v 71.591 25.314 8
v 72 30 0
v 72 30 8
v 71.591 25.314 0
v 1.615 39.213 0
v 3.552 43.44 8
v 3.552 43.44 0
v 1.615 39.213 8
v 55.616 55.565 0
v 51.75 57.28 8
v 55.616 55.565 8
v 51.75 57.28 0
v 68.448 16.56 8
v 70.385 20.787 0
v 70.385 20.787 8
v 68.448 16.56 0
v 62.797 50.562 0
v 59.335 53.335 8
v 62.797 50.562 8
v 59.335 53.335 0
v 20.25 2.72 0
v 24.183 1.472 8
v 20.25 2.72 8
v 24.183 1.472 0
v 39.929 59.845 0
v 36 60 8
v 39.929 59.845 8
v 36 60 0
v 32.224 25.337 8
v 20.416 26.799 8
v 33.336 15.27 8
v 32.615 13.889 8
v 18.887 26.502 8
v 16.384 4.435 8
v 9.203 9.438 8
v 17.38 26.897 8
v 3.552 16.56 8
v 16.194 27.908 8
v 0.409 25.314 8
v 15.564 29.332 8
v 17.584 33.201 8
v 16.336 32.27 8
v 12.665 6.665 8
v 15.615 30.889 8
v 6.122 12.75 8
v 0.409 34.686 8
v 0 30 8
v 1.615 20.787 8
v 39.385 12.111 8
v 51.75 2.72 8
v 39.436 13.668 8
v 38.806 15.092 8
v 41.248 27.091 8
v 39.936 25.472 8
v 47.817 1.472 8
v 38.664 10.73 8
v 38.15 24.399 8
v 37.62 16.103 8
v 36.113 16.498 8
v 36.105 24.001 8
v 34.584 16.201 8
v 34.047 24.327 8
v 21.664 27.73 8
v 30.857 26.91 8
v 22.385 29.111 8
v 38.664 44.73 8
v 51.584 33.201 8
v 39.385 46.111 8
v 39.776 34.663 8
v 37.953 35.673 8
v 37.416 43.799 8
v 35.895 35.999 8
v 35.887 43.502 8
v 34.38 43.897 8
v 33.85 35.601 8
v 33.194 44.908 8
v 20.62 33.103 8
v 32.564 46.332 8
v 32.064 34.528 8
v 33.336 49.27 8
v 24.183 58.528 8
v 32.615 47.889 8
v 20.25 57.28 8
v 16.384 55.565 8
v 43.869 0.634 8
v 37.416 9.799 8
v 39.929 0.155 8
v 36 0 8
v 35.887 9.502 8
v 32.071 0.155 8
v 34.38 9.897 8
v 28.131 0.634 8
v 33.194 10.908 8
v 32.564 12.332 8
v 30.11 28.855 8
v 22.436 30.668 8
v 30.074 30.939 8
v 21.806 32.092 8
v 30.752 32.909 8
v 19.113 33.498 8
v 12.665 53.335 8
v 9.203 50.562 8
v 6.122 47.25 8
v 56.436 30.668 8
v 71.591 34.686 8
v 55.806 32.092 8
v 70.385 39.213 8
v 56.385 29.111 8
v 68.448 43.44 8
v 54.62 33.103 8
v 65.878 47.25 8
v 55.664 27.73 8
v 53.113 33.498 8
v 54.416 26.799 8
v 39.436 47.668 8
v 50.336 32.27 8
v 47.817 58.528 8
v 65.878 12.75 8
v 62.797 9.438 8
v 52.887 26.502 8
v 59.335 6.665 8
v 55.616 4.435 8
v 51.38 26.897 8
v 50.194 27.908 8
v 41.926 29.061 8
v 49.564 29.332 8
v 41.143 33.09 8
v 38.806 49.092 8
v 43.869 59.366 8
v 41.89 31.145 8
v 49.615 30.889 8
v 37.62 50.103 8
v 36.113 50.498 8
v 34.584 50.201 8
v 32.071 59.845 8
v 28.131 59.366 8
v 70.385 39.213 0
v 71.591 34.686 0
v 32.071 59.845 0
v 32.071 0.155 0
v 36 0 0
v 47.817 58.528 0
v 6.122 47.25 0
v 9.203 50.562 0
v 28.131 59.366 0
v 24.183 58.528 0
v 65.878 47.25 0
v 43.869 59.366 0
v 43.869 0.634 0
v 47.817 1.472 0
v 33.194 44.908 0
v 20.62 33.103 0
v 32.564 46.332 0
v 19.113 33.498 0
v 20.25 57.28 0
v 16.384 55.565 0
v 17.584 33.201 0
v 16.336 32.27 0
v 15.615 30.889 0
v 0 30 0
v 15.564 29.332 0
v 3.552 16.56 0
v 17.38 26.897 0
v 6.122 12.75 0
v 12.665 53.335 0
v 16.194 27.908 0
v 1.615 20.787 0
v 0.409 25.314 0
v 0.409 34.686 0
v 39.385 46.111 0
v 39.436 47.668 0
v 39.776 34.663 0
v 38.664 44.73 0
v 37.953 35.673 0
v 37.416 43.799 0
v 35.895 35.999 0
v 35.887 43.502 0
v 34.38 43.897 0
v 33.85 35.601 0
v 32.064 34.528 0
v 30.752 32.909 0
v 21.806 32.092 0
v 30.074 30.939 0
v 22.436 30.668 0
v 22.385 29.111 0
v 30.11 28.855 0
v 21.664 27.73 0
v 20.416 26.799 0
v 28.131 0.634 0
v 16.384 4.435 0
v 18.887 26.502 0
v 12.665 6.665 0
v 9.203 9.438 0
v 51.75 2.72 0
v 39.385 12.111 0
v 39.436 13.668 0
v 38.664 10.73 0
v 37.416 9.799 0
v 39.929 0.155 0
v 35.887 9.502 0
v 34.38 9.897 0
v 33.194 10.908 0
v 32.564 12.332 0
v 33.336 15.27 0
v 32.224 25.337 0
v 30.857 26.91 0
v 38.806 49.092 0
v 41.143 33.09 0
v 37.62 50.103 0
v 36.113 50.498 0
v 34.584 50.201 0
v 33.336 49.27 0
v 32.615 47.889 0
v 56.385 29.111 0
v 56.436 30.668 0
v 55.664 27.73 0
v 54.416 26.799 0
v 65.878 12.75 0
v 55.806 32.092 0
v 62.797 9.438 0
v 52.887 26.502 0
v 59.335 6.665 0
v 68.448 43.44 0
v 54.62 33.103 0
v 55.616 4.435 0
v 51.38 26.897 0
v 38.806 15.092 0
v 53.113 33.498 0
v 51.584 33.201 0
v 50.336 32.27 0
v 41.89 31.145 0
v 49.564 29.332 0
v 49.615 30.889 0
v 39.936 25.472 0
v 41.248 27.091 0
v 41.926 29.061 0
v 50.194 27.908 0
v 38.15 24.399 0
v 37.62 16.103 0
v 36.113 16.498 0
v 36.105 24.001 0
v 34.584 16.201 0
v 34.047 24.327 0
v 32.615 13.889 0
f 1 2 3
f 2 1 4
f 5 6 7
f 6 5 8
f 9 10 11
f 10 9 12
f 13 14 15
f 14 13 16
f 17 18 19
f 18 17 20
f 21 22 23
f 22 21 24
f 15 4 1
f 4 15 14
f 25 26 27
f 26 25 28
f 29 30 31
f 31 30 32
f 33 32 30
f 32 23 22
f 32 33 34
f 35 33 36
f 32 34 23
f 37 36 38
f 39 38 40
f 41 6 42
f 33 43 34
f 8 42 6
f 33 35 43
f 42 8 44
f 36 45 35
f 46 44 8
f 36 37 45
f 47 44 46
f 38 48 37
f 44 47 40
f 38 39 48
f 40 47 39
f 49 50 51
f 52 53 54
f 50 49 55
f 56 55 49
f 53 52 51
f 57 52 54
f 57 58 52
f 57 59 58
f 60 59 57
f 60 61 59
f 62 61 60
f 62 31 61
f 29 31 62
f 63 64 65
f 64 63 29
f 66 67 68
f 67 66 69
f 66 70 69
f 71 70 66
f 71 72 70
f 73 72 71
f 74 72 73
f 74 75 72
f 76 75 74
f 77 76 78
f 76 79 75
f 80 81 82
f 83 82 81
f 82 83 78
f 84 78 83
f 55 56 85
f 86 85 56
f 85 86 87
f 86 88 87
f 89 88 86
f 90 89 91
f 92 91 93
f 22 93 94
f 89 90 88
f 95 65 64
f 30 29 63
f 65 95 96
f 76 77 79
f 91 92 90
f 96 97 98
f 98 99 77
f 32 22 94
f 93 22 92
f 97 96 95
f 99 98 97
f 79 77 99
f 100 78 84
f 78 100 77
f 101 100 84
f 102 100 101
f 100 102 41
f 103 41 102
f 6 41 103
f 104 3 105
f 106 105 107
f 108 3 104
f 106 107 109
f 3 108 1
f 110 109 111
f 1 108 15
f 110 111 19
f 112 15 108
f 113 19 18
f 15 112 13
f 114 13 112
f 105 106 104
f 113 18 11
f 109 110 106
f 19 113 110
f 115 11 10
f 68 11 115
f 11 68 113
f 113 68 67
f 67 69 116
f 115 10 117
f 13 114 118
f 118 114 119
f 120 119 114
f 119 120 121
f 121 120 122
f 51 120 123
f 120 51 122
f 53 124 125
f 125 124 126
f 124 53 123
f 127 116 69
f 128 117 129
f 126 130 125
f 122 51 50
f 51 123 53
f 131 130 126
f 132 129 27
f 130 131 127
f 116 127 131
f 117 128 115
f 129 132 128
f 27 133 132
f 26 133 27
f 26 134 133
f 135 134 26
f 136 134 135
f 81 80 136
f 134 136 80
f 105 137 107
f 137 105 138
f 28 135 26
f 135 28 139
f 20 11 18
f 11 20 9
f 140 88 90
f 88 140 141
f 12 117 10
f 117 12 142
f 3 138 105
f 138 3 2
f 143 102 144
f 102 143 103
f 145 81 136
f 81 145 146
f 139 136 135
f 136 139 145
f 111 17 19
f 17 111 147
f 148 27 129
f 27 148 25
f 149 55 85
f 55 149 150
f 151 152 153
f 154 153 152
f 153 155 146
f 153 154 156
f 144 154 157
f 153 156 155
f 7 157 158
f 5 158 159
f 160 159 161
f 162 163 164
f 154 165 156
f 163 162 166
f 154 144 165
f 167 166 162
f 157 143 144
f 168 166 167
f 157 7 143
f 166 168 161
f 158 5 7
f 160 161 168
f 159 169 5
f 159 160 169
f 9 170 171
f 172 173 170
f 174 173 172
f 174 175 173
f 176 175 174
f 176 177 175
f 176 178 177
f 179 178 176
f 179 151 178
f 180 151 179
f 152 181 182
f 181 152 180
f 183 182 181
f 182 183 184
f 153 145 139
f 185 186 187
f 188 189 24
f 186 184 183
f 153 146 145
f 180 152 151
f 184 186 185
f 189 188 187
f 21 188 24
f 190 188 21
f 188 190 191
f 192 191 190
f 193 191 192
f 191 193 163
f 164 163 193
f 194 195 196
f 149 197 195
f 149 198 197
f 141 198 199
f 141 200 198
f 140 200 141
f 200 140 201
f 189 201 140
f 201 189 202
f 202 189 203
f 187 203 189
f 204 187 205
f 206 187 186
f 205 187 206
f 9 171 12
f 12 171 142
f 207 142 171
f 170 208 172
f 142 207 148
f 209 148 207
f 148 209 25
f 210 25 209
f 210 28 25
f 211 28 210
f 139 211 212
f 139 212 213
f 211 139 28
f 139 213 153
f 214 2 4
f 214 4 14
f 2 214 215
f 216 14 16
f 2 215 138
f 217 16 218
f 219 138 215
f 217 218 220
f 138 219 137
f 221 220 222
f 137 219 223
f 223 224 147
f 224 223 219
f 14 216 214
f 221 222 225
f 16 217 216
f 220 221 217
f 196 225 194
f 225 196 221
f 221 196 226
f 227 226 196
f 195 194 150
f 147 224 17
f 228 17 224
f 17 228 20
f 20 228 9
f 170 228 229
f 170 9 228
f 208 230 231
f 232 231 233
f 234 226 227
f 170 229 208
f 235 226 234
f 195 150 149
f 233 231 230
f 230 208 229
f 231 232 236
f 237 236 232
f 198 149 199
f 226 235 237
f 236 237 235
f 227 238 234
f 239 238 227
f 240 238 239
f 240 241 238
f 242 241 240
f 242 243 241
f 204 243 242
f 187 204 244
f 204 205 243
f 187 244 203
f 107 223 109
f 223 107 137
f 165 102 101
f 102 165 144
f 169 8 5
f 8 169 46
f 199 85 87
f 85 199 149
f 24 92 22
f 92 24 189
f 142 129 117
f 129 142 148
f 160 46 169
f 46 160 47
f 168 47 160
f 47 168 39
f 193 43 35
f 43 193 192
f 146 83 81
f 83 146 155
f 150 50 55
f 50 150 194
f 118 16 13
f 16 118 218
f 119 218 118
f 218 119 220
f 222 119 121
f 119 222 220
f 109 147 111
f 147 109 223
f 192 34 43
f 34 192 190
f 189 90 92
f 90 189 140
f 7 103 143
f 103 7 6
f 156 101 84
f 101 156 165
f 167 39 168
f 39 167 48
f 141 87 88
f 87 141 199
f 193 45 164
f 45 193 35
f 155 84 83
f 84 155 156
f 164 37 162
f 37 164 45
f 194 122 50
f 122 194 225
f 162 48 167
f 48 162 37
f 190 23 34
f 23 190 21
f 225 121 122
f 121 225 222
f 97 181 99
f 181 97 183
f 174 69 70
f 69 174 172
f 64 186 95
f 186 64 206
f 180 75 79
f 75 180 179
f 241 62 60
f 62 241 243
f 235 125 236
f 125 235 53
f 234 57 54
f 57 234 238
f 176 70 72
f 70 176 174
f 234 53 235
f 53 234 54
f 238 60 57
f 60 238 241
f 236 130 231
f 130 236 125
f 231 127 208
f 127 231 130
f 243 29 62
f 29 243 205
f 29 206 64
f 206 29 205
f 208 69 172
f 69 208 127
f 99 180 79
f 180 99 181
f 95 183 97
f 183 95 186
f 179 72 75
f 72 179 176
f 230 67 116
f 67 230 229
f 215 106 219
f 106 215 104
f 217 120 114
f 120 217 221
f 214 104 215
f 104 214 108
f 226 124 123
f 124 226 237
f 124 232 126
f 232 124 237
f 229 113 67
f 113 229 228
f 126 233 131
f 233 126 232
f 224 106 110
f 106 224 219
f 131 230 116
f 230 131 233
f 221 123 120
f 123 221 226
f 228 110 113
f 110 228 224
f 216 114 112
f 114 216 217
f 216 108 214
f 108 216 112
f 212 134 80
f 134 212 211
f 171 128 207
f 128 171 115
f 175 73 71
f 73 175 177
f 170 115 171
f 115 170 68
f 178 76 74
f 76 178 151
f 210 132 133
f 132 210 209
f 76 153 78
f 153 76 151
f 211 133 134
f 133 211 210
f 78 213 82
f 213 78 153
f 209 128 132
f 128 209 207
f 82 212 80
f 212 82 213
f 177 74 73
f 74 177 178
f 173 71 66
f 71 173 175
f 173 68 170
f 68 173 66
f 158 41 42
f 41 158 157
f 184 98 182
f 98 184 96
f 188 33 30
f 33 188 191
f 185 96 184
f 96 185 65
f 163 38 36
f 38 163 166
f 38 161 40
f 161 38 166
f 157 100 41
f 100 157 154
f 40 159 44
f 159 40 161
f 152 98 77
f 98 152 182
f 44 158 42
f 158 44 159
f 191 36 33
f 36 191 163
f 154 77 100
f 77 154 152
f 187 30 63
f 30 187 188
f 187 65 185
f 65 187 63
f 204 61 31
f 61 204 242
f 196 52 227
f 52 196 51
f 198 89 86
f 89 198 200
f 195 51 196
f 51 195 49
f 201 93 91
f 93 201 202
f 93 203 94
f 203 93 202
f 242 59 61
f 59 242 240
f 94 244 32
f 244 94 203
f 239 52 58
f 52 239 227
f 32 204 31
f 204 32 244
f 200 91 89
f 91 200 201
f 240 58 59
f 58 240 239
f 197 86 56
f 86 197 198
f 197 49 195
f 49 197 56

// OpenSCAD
$fn = 32;

// ----------------------------------------------------------------------
// Cam plate: double_lobe cam, base R28
// ----------------------------------------------------------------------

// --- parameters (mm) ---
base_r = 28;              // base circle radius
lobe_h = 8;               // cam lobe rise
bore_r = 6;               // shaft bore radius
plate_t = 8;              // plate thickness, Z (extrusion height)
ring_r = 17;              // lightening ring radius
bolt_r = 3.5;             // lightening hole radius

profile = [[72, 30], [71.591, 34.686], [70.385, 39.213], [68.448, 43.44], [65.878, 47.25], [62.797, 50.562], [59.335, 53.335], [55.616, 55.565], [51.75, 57.28], [47.817, 58.528], [43.869, 59.366], [39.929, 59.845], [36, 60], [32.071, 59.845], [28.131, 59.366], [24.183, 58.528], [20.25, 57.28], [16.384, 55.565], [12.665, 53.335], [9.203, 50.562], [6.122, 47.25], [3.552, 43.44], [1.615, 39.213], [0.409, 34.686], [0, 30], [0.409, 25.314], [1.615, 20.787], [3.552, 16.56], [6.122, 12.75], [9.203, 9.438], [12.665, 6.665], [16.384, 4.435], [20.25, 2.72], [24.183, 1.472], [28.131, 0.634], [32.071, 0.155], [36, 0], [39.929, 0.155], [43.869, 0.634], [47.817, 1.472], [51.75, 2.72], [55.616, 4.435], [59.335, 6.665], [62.797, 9.438], [65.878, 12.75], [68.448, 16.56], [70.385, 20.787], [71.591, 25.314]];  // primary outline, 48 points, counter clockwise
void_1 = [[41.89, 31.145], [41.143, 33.09], [39.776, 34.663], [37.953, 35.673], [35.895, 35.999], [33.85, 35.601], [32.064, 34.528], [30.752, 32.909], [30.074, 30.939], [30.11, 28.855], [30.857, 26.91], [32.224, 25.337], [34.047, 24.327], [36.105, 24.001], [38.15, 24.399], [39.936, 25.472], [41.248, 27.091], [41.926, 29.061]];  // shaft bore, 18 points
void_2 = [[56.436, 30.668], [55.806, 32.092], [54.62, 33.103], [53.113, 33.498], [51.584, 33.201], [50.336, 32.27], [49.615, 30.889], [49.564, 29.332], [50.194, 27.908], [51.38, 26.897], [52.887, 26.502], [54.416, 26.799], [55.664, 27.73], [56.385, 29.111]];  // lightening hole 1, 14 points
void_3 = [[39.436, 47.668], [38.806, 49.092], [37.62, 50.103], [36.113, 50.498], [34.584, 50.201], [33.336, 49.27], [32.615, 47.889], [32.564, 46.332], [33.194, 44.908], [34.38, 43.897], [35.887, 43.502], [37.416, 43.799], [38.664, 44.73], [39.385, 46.111]];  // lightening hole 2, 14 points
void_4 = [[22.436, 30.668], [21.806, 32.092], [20.62, 33.103], [19.113, 33.498], [17.584, 33.201], [16.336, 32.27], [15.615, 30.889], [15.564, 29.332], [16.194, 27.908], [17.38, 26.897], [18.887, 26.502], [20.416, 26.799], [21.664, 27.73], [22.385, 29.111]];  // lightening hole 3, 14 points
void_5 = [[39.436, 13.668], [38.806, 15.092], [37.62, 16.103], [36.113, 16.498], [34.584, 16.201], [33.336, 15.27], [32.615, 13.889], [32.564, 12.332], [33.194, 10.908], [34.38, 9.897], [35.887, 9.502], [37.416, 9.799], [38.664, 10.73], [39.385, 12.111]];  // lightening hole 4, 14 points

// --- the one profile operation ---
difference() {
  linear_extrude(height = plate_t) polygon(points = profile);
  translate([0, 0, -1])
    linear_extrude(height = plate_t + 2) polygon(points = void_1);
  translate([0, 0, -1])
    linear_extrude(height = plate_t + 2) polygon(points = void_2);
  translate([0, 0, -1])
    linear_extrude(height = plate_t + 2) polygon(points = void_3);
  translate([0, 0, -1])
    linear_extrude(height = plate_t + 2) polygon(points = void_4);
  translate([0, 0, -1])
    linear_extrude(height = plate_t + 2) polygon(points = void_5);
}
